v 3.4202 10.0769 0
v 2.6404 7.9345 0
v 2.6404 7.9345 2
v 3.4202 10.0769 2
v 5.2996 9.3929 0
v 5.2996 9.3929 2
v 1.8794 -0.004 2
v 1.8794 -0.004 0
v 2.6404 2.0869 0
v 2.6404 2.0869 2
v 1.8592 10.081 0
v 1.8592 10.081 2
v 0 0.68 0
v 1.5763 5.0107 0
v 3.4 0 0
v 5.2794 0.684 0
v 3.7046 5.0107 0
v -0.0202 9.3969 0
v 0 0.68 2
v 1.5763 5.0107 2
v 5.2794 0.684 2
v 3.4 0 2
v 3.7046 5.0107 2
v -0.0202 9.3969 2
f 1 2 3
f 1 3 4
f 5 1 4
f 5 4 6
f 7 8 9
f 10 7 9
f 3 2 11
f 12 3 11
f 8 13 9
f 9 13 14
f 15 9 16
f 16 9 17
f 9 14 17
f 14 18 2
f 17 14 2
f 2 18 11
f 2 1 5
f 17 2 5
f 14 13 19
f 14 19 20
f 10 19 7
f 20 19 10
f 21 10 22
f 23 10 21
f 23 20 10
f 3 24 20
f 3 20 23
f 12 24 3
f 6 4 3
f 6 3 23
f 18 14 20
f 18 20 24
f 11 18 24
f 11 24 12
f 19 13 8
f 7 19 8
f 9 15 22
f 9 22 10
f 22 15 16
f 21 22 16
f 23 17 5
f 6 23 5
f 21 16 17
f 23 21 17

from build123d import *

# Parameters (mm, degrees)
BOX001_W               = 2
BOX001_H               = 10
BOX001_DEPTH           = 2
BOX001_PLACEMENT_ANGLE = 340
BOX_W                  = 2
BOX_H                  = 10
BOX_DEPTH              = 2
BOX_PLACEMENT_ANGLE    = 20


with BuildPart() as cub001:
    # Box001 → Box001 (new body)
    with BuildSketch(Plane.XY):
        with Locations((1, 5)):
            Rectangle(BOX001_W, BOX001_H)
    extrude(amount=BOX001_DEPTH)


with BuildPart() as cub001_1:
    # Box001 placement: moved
    add(cub001.part.moved(Location((0, 0.68, 0))).rotate(Axis((0, 0.68, 0), (0, 0, 1)), BOX001_PLACEMENT_ANGLE))


with BuildPart() as fusion:
    # Box → Box (new body)
    with BuildSketch(Plane.XY):
        with Locations((1, 5)):
            Rectangle(BOX_W, BOX_H)
    extrude(amount=BOX_DEPTH)


with BuildPart() as fusion_1:
    # Box placement: moved
    add(fusion.part.moved(Location((3.4, 0, 0))).rotate(Axis((3.4, 0, 0), (0, 0, 1)), BOX_PLACEMENT_ANGLE))

    # Fusion: union Cub001
    add(cub001_1.part)


solid = fusion_1.part
